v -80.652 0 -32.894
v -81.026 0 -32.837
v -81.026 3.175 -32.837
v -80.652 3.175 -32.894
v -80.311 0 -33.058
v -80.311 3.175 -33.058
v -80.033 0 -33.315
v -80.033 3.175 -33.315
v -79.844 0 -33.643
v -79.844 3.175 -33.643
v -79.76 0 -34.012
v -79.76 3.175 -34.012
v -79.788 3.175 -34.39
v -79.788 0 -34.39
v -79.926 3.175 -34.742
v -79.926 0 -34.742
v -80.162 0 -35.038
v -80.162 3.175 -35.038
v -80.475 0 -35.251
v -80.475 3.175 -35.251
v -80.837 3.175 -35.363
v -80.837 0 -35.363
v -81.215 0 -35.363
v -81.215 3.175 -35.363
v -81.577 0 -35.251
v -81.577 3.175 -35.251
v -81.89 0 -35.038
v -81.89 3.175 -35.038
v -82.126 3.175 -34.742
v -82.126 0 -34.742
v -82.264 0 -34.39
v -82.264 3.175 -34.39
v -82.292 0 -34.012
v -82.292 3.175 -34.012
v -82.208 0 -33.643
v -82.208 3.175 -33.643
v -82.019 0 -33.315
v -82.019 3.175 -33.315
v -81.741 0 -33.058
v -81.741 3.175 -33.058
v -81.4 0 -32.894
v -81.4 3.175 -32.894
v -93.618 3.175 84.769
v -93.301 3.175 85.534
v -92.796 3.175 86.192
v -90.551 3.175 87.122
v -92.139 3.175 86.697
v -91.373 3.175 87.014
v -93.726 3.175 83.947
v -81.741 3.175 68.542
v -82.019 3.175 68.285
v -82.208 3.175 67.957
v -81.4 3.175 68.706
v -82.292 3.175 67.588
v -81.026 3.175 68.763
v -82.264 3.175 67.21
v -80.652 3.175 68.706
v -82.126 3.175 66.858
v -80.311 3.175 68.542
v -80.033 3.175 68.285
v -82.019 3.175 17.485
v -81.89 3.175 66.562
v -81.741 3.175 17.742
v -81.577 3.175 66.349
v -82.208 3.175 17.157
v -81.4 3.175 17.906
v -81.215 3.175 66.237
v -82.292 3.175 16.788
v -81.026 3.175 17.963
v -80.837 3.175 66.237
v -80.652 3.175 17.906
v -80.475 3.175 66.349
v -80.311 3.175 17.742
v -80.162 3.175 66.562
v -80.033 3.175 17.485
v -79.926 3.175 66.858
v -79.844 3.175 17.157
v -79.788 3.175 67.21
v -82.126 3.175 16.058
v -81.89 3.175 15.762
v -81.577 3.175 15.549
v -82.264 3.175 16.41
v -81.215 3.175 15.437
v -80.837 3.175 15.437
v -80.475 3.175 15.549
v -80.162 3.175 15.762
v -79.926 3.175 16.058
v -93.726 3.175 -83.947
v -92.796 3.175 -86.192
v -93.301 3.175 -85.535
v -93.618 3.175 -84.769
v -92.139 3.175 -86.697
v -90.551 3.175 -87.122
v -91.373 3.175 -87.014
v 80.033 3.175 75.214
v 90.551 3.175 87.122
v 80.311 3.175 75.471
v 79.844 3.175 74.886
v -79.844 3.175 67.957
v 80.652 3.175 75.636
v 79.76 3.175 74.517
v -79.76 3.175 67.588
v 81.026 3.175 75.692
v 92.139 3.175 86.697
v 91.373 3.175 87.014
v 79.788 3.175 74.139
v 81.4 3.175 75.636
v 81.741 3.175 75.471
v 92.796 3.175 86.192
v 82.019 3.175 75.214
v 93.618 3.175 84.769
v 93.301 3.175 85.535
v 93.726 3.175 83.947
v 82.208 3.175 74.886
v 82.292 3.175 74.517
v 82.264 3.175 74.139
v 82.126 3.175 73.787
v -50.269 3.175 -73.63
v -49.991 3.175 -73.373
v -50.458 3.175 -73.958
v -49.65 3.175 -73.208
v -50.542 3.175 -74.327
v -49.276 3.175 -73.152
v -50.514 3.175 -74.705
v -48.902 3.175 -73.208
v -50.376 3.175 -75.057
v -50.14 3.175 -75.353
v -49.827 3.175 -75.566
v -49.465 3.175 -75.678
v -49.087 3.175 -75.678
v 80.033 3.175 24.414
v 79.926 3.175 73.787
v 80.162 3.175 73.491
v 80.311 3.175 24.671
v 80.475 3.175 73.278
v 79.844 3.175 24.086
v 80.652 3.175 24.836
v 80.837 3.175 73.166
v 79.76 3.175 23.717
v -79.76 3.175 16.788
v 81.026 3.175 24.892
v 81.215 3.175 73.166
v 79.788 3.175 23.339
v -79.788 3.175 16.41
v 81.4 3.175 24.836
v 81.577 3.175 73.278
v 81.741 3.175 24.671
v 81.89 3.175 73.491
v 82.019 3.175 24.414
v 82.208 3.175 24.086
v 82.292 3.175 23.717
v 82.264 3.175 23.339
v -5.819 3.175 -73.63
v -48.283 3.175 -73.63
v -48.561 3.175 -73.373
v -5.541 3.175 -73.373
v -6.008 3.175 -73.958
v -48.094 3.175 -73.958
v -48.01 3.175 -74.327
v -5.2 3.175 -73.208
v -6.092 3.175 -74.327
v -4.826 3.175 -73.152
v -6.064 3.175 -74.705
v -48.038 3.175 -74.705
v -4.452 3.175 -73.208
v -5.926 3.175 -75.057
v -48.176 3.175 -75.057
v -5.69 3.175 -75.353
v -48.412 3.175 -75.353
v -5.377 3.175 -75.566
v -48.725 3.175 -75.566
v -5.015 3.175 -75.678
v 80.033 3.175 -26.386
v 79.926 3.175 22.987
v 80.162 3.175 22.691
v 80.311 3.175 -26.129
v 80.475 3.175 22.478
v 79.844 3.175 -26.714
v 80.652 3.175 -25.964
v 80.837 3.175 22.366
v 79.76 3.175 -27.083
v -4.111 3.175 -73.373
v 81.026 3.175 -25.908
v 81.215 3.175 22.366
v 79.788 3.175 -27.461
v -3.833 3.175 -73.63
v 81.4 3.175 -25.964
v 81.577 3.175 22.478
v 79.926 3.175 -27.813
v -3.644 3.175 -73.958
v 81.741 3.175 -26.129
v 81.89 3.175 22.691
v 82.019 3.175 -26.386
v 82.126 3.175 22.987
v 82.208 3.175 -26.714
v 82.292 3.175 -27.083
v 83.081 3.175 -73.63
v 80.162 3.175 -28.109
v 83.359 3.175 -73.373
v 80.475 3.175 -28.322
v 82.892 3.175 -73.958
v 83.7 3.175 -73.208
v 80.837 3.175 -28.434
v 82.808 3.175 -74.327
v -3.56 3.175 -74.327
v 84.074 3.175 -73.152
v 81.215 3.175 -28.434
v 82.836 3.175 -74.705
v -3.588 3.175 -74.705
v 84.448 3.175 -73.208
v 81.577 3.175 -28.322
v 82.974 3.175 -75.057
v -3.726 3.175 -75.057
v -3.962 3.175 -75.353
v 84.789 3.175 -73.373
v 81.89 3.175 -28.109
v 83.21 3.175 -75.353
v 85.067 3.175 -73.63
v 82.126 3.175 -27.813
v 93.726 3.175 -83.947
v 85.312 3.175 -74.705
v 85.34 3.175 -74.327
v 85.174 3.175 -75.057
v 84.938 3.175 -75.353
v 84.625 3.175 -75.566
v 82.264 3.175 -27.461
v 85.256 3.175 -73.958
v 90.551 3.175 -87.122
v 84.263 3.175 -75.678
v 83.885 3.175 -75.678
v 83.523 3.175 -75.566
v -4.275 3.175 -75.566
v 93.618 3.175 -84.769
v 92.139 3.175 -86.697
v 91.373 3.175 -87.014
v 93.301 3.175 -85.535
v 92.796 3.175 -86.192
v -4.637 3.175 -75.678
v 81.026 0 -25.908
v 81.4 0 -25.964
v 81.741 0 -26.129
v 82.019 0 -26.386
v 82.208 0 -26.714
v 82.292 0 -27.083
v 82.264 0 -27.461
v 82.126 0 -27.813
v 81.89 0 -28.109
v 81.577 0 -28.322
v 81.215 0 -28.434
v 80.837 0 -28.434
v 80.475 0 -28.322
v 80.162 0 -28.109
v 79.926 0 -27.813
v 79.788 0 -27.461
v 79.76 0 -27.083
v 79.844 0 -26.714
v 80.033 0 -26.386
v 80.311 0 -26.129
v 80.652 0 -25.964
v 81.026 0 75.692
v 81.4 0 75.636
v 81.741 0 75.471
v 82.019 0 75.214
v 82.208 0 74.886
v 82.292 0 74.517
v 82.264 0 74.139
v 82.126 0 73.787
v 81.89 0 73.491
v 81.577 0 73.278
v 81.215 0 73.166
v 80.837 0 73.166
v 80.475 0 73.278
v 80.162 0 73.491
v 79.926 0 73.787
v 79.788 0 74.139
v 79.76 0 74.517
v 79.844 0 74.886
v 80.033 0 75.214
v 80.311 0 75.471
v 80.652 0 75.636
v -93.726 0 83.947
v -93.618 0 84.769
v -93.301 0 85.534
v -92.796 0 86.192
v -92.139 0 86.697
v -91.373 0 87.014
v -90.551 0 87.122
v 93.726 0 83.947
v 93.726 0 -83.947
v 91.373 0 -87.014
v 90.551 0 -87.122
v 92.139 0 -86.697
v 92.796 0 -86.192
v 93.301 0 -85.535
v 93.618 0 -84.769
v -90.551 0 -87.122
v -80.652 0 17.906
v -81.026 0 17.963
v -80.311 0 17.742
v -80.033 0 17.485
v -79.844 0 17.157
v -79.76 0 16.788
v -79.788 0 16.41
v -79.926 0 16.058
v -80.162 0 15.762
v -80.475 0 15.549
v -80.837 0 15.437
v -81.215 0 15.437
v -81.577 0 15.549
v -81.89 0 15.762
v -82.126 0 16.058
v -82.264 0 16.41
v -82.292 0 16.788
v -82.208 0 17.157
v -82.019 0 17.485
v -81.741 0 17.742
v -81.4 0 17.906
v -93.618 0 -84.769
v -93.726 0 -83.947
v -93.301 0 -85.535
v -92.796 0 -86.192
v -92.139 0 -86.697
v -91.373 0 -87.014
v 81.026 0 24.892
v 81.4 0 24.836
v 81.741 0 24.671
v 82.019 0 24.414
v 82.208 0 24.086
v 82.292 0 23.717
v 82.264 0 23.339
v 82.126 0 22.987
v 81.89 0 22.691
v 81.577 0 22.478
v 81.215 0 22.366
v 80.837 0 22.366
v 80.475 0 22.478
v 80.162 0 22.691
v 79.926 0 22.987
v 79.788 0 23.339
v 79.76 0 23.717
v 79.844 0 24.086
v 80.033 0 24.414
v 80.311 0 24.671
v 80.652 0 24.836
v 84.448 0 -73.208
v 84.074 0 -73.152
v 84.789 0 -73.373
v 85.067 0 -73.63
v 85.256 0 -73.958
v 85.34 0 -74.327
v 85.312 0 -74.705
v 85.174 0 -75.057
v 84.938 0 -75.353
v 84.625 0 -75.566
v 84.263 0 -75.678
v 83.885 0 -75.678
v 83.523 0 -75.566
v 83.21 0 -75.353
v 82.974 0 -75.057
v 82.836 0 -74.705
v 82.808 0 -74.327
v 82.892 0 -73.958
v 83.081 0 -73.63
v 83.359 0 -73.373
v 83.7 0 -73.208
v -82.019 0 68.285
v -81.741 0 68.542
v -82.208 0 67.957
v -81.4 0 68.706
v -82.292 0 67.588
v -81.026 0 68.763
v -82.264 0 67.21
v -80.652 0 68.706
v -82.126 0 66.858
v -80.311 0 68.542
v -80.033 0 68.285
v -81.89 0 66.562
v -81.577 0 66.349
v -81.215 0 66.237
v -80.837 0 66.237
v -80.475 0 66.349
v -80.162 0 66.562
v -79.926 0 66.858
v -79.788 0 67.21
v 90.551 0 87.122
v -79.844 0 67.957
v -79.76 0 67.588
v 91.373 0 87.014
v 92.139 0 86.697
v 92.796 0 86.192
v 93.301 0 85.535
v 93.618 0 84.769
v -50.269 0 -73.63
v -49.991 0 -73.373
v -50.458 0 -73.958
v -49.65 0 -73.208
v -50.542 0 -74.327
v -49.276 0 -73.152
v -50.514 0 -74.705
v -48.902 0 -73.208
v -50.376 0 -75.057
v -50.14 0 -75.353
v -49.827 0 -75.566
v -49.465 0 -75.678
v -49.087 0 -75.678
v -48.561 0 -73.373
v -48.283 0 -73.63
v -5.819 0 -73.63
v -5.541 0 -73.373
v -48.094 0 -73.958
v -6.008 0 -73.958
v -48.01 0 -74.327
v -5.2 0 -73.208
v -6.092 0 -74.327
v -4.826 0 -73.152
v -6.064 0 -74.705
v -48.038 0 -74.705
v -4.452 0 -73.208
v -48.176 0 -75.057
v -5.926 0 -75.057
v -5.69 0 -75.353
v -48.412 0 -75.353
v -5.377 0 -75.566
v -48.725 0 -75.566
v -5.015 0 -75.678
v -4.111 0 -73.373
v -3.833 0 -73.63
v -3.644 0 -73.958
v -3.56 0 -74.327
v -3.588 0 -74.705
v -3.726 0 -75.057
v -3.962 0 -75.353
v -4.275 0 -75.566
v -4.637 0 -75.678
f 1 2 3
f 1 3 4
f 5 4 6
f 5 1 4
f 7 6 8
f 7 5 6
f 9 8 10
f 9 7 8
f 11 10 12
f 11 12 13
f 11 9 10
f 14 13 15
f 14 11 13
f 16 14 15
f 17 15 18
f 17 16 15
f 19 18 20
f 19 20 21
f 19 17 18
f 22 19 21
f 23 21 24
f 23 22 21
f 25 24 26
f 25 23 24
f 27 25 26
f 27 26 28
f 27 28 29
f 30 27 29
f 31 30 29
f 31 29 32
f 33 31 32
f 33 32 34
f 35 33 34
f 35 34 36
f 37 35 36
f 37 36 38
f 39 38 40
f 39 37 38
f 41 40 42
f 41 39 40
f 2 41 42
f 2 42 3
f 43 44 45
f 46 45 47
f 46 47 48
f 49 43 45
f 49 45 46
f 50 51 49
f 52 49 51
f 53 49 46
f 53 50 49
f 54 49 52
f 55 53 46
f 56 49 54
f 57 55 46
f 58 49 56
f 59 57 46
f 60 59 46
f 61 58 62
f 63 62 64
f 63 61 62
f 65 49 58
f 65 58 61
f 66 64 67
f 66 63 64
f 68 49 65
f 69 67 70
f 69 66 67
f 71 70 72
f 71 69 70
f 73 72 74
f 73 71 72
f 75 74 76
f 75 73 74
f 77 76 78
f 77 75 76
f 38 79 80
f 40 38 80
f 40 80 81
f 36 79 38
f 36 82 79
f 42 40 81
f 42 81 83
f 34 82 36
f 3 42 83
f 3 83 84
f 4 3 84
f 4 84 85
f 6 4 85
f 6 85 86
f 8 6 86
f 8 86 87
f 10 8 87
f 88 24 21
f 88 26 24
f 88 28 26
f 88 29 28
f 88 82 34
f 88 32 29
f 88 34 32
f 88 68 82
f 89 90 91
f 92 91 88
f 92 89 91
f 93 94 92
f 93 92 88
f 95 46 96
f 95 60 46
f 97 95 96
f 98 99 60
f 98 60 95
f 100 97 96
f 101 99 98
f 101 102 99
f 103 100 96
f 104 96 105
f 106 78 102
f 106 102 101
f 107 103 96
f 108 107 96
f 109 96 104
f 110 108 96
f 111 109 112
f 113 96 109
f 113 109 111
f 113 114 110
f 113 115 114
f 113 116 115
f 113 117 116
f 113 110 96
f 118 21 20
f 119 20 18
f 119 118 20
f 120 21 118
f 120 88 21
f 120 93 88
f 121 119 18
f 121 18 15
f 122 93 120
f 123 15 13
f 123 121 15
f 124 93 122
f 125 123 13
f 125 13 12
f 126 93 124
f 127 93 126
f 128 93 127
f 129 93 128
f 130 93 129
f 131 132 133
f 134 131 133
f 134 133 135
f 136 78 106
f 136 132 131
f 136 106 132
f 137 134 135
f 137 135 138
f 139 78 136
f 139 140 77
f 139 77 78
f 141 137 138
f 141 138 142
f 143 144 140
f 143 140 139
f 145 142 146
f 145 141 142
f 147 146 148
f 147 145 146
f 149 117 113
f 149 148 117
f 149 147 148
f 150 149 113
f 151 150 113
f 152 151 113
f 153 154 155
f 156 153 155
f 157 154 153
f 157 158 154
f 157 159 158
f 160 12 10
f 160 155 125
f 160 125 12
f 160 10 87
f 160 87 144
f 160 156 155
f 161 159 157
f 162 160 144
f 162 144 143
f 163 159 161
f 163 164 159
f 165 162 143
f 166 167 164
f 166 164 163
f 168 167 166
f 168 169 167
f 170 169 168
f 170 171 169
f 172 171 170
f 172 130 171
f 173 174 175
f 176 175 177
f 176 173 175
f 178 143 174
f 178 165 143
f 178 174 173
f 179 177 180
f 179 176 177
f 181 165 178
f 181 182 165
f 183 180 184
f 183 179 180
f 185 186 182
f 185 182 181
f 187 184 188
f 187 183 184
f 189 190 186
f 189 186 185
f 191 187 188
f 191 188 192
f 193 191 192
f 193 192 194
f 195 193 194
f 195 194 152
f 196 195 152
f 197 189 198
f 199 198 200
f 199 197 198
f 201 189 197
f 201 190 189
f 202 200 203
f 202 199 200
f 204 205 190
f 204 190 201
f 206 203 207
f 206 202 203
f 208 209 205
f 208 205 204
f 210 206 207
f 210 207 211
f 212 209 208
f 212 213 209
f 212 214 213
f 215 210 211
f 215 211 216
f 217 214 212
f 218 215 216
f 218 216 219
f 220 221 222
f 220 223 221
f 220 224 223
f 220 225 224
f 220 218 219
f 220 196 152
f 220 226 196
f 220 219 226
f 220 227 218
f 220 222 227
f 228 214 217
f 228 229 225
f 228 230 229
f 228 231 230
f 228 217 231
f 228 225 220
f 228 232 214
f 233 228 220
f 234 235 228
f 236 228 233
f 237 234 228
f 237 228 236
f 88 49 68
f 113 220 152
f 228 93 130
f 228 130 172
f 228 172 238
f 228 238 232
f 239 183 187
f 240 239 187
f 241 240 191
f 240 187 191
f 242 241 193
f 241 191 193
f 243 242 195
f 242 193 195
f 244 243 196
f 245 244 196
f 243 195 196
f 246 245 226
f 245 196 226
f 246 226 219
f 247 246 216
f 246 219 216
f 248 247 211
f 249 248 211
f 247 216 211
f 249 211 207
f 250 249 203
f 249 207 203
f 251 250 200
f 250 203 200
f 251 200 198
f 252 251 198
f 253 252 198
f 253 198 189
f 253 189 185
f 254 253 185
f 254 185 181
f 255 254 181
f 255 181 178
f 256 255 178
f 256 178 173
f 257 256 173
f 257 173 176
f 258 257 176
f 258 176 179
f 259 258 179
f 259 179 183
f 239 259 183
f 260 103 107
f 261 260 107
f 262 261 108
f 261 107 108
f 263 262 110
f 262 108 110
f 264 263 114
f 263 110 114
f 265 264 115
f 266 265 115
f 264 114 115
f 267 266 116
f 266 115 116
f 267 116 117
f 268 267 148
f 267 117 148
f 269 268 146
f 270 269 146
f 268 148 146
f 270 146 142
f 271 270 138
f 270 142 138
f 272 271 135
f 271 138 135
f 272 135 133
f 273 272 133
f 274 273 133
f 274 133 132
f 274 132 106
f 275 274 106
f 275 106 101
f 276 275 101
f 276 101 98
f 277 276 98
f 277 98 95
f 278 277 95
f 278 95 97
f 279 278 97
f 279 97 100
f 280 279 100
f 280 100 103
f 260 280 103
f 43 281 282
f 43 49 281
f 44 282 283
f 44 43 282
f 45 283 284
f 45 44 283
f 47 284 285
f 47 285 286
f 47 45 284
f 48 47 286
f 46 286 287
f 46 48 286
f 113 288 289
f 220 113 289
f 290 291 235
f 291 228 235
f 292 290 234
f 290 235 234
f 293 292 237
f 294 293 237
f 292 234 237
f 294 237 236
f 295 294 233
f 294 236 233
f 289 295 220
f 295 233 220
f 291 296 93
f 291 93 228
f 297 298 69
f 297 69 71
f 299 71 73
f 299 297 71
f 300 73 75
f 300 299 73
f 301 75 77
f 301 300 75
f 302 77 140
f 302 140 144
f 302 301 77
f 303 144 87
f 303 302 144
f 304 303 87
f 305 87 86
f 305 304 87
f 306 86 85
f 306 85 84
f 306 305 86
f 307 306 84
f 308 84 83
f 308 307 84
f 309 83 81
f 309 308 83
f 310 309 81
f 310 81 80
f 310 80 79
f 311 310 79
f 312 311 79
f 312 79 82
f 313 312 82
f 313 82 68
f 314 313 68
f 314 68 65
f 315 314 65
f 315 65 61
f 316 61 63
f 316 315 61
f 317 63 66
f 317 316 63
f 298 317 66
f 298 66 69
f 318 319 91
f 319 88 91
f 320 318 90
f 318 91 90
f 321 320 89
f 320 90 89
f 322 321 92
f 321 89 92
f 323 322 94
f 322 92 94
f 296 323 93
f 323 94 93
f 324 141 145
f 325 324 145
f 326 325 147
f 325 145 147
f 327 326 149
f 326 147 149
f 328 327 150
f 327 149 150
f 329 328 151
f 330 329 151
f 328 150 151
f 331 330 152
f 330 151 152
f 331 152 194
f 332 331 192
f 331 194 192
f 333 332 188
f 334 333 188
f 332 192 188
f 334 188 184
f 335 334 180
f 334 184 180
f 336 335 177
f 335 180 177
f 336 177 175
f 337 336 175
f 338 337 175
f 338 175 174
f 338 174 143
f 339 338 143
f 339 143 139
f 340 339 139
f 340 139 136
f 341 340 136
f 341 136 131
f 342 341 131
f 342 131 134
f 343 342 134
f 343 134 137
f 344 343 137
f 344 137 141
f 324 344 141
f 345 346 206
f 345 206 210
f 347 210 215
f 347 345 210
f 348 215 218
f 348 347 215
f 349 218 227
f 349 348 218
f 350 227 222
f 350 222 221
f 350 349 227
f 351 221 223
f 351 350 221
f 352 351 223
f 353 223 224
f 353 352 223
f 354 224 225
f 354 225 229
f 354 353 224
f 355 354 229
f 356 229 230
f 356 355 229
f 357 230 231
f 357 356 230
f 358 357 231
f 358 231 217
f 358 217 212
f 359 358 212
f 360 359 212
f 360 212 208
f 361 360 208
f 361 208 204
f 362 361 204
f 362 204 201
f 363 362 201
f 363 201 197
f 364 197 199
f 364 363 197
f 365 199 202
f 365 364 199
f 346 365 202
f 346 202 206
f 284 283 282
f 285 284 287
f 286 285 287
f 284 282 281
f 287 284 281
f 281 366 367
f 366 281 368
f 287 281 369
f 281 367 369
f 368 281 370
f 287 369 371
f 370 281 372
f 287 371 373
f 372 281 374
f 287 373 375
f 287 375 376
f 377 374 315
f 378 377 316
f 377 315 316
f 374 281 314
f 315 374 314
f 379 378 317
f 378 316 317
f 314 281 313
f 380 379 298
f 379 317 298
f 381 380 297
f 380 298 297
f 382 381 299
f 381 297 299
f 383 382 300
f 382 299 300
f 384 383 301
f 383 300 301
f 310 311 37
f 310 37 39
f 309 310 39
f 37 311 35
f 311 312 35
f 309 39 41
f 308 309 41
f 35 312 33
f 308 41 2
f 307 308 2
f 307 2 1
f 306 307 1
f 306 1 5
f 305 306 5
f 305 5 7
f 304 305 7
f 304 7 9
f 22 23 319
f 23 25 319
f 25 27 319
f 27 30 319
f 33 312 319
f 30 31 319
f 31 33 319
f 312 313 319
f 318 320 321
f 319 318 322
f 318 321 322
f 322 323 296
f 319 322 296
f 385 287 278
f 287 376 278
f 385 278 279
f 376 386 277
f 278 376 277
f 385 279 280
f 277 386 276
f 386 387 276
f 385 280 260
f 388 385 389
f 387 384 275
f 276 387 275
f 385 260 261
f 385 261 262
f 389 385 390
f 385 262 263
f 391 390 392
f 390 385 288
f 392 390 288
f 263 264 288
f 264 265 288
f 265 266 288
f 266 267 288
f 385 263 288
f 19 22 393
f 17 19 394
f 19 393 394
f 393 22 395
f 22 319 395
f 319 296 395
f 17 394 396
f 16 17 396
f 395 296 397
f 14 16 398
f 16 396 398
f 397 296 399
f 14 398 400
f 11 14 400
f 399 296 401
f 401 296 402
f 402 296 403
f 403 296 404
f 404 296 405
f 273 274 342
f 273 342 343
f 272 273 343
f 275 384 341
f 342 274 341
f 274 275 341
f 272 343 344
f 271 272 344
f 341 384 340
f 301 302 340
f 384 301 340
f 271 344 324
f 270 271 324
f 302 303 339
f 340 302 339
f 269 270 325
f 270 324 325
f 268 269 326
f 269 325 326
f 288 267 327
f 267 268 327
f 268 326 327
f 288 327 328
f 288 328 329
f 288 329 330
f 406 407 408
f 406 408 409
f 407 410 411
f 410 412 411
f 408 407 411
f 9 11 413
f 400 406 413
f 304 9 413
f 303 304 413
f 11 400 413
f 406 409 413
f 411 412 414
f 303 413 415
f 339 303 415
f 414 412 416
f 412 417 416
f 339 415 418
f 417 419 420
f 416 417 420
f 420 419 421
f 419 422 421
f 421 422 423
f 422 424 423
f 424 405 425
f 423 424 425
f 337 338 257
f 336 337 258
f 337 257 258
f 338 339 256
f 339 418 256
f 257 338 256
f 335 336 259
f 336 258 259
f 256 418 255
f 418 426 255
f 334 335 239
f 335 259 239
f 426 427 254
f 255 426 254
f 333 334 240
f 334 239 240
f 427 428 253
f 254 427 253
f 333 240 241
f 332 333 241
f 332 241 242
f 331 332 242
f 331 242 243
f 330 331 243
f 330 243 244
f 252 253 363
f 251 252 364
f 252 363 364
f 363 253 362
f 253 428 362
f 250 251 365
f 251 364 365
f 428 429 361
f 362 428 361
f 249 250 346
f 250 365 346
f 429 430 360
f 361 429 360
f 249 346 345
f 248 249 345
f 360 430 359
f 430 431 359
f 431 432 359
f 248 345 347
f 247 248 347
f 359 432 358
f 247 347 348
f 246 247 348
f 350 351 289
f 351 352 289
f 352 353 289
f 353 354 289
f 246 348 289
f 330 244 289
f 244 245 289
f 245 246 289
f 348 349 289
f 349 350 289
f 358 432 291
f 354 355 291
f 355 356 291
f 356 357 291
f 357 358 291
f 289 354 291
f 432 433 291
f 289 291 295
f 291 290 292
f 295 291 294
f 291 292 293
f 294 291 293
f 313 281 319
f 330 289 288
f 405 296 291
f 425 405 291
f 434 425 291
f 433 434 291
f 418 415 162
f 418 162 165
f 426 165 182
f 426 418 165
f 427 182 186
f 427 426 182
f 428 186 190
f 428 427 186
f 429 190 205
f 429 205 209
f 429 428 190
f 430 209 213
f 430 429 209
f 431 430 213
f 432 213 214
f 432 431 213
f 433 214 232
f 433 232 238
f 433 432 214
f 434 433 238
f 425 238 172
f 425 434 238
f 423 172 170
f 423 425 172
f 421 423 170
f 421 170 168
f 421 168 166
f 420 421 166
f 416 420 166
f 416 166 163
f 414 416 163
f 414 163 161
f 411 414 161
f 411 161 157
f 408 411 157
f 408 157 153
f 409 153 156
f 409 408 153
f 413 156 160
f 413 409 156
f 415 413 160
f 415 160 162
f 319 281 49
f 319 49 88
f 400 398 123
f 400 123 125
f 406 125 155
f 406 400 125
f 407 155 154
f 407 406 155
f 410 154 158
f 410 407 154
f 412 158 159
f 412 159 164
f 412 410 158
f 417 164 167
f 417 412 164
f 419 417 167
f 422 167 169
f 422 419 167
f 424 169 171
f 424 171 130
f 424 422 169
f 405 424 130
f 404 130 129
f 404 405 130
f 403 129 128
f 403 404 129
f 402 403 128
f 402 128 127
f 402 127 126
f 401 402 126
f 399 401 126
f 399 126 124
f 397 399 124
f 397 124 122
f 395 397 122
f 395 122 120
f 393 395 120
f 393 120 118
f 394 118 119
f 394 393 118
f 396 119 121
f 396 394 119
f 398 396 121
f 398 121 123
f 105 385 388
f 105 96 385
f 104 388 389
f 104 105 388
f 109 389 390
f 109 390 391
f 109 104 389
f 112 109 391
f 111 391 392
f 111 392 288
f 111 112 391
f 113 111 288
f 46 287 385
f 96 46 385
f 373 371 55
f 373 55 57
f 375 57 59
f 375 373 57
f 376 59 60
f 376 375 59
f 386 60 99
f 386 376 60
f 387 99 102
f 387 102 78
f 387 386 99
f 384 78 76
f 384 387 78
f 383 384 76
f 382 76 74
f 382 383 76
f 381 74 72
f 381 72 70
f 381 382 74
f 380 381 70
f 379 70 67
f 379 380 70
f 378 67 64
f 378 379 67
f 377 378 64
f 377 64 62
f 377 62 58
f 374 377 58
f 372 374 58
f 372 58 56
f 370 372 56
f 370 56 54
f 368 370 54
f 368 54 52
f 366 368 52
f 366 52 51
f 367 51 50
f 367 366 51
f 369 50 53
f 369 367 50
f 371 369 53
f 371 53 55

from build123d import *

# Parameters (mm, degrees)
SKETCH1_W           = 187.452
SKETCH1_H           = 174.244
SKETCH1_R           = 1.27
BOSS_EXTRUDE1_DEPTH = 3.175
SKETCH2_R           = 1.27
CUT_EXTRUDE3_DEPTH  = 129.003463176
FILLET1_R           = 3.175


with BuildPart() as part:
    # Sketch1 → Boss-Extrude1 (new body)
    with BuildSketch(Plane(origin=(0, 0, 0), x_dir=(1, 0, 0), z_dir=(0, 1, 0))):
        Rectangle(SKETCH1_W, SKETCH1_H)
        with Locations(Location((-81.026, -67.49288, 0), (0, 0, 270))):
            Circle(SKETCH1_R, mode=Mode.SUBTRACT)
        with Locations(Location((-81.026, -16.69288, 0), (0, 0, 270))):
            Circle(SKETCH1_R, mode=Mode.SUBTRACT)
        with Locations(Location((-81.026, 34.10712, 0), (0, 0, 270))):
            Circle(SKETCH1_R, mode=Mode.SUBTRACT)
        with Locations(Location((-4.826, 74.422, 0), (0, 0, 270))):
            Circle(SKETCH1_R, mode=Mode.SUBTRACT)
        with Locations(Location((84.074, 74.422, 0), (0, 0, 270))):
            Circle(SKETCH1_R, mode=Mode.SUBTRACT)
        with Locations(Location((-49.276, 74.422, 0), (0, 0, 270))):
            Circle(SKETCH1_R, mode=Mode.SUBTRACT)
    extrude(amount=BOSS_EXTRUDE1_DEPTH)

    # Sketch2 → Cut-Extrude3 (cut, through all)
    with BuildSketch(Plane(origin=(0, 3.175, 0), x_dir=(1, 0, 0), z_dir=(0, 1, 0))):
        with Locations(Location((81.026, -74.422, 0), (0, 0, 270))):
            Circle(SKETCH2_R)
        with Locations(Location((81.026, -23.622, 0), (0, 0, 270))):
            Circle(SKETCH2_R)
        with Locations(Location((81.026, 27.178, 0), (0, 0, 270))):
            Circle(SKETCH2_R)
    extrude(amount=-CUT_EXTRUDE3_DEPTH, mode=Mode.SUBTRACT)

    # Fillet1
    fillet1_edges = [part.edges().sort_by_distance(p)[0] for p in [
        (93.726, 1.5875, 87.122),
        (-93.726, 1.5875, 87.122),
        (-93.726, 1.5875, -87.122),
        (93.726, 1.5875, -87.122),
    ]]
    fillet(fillet1_edges, radius=FILLET1_R)


solid = part.part
